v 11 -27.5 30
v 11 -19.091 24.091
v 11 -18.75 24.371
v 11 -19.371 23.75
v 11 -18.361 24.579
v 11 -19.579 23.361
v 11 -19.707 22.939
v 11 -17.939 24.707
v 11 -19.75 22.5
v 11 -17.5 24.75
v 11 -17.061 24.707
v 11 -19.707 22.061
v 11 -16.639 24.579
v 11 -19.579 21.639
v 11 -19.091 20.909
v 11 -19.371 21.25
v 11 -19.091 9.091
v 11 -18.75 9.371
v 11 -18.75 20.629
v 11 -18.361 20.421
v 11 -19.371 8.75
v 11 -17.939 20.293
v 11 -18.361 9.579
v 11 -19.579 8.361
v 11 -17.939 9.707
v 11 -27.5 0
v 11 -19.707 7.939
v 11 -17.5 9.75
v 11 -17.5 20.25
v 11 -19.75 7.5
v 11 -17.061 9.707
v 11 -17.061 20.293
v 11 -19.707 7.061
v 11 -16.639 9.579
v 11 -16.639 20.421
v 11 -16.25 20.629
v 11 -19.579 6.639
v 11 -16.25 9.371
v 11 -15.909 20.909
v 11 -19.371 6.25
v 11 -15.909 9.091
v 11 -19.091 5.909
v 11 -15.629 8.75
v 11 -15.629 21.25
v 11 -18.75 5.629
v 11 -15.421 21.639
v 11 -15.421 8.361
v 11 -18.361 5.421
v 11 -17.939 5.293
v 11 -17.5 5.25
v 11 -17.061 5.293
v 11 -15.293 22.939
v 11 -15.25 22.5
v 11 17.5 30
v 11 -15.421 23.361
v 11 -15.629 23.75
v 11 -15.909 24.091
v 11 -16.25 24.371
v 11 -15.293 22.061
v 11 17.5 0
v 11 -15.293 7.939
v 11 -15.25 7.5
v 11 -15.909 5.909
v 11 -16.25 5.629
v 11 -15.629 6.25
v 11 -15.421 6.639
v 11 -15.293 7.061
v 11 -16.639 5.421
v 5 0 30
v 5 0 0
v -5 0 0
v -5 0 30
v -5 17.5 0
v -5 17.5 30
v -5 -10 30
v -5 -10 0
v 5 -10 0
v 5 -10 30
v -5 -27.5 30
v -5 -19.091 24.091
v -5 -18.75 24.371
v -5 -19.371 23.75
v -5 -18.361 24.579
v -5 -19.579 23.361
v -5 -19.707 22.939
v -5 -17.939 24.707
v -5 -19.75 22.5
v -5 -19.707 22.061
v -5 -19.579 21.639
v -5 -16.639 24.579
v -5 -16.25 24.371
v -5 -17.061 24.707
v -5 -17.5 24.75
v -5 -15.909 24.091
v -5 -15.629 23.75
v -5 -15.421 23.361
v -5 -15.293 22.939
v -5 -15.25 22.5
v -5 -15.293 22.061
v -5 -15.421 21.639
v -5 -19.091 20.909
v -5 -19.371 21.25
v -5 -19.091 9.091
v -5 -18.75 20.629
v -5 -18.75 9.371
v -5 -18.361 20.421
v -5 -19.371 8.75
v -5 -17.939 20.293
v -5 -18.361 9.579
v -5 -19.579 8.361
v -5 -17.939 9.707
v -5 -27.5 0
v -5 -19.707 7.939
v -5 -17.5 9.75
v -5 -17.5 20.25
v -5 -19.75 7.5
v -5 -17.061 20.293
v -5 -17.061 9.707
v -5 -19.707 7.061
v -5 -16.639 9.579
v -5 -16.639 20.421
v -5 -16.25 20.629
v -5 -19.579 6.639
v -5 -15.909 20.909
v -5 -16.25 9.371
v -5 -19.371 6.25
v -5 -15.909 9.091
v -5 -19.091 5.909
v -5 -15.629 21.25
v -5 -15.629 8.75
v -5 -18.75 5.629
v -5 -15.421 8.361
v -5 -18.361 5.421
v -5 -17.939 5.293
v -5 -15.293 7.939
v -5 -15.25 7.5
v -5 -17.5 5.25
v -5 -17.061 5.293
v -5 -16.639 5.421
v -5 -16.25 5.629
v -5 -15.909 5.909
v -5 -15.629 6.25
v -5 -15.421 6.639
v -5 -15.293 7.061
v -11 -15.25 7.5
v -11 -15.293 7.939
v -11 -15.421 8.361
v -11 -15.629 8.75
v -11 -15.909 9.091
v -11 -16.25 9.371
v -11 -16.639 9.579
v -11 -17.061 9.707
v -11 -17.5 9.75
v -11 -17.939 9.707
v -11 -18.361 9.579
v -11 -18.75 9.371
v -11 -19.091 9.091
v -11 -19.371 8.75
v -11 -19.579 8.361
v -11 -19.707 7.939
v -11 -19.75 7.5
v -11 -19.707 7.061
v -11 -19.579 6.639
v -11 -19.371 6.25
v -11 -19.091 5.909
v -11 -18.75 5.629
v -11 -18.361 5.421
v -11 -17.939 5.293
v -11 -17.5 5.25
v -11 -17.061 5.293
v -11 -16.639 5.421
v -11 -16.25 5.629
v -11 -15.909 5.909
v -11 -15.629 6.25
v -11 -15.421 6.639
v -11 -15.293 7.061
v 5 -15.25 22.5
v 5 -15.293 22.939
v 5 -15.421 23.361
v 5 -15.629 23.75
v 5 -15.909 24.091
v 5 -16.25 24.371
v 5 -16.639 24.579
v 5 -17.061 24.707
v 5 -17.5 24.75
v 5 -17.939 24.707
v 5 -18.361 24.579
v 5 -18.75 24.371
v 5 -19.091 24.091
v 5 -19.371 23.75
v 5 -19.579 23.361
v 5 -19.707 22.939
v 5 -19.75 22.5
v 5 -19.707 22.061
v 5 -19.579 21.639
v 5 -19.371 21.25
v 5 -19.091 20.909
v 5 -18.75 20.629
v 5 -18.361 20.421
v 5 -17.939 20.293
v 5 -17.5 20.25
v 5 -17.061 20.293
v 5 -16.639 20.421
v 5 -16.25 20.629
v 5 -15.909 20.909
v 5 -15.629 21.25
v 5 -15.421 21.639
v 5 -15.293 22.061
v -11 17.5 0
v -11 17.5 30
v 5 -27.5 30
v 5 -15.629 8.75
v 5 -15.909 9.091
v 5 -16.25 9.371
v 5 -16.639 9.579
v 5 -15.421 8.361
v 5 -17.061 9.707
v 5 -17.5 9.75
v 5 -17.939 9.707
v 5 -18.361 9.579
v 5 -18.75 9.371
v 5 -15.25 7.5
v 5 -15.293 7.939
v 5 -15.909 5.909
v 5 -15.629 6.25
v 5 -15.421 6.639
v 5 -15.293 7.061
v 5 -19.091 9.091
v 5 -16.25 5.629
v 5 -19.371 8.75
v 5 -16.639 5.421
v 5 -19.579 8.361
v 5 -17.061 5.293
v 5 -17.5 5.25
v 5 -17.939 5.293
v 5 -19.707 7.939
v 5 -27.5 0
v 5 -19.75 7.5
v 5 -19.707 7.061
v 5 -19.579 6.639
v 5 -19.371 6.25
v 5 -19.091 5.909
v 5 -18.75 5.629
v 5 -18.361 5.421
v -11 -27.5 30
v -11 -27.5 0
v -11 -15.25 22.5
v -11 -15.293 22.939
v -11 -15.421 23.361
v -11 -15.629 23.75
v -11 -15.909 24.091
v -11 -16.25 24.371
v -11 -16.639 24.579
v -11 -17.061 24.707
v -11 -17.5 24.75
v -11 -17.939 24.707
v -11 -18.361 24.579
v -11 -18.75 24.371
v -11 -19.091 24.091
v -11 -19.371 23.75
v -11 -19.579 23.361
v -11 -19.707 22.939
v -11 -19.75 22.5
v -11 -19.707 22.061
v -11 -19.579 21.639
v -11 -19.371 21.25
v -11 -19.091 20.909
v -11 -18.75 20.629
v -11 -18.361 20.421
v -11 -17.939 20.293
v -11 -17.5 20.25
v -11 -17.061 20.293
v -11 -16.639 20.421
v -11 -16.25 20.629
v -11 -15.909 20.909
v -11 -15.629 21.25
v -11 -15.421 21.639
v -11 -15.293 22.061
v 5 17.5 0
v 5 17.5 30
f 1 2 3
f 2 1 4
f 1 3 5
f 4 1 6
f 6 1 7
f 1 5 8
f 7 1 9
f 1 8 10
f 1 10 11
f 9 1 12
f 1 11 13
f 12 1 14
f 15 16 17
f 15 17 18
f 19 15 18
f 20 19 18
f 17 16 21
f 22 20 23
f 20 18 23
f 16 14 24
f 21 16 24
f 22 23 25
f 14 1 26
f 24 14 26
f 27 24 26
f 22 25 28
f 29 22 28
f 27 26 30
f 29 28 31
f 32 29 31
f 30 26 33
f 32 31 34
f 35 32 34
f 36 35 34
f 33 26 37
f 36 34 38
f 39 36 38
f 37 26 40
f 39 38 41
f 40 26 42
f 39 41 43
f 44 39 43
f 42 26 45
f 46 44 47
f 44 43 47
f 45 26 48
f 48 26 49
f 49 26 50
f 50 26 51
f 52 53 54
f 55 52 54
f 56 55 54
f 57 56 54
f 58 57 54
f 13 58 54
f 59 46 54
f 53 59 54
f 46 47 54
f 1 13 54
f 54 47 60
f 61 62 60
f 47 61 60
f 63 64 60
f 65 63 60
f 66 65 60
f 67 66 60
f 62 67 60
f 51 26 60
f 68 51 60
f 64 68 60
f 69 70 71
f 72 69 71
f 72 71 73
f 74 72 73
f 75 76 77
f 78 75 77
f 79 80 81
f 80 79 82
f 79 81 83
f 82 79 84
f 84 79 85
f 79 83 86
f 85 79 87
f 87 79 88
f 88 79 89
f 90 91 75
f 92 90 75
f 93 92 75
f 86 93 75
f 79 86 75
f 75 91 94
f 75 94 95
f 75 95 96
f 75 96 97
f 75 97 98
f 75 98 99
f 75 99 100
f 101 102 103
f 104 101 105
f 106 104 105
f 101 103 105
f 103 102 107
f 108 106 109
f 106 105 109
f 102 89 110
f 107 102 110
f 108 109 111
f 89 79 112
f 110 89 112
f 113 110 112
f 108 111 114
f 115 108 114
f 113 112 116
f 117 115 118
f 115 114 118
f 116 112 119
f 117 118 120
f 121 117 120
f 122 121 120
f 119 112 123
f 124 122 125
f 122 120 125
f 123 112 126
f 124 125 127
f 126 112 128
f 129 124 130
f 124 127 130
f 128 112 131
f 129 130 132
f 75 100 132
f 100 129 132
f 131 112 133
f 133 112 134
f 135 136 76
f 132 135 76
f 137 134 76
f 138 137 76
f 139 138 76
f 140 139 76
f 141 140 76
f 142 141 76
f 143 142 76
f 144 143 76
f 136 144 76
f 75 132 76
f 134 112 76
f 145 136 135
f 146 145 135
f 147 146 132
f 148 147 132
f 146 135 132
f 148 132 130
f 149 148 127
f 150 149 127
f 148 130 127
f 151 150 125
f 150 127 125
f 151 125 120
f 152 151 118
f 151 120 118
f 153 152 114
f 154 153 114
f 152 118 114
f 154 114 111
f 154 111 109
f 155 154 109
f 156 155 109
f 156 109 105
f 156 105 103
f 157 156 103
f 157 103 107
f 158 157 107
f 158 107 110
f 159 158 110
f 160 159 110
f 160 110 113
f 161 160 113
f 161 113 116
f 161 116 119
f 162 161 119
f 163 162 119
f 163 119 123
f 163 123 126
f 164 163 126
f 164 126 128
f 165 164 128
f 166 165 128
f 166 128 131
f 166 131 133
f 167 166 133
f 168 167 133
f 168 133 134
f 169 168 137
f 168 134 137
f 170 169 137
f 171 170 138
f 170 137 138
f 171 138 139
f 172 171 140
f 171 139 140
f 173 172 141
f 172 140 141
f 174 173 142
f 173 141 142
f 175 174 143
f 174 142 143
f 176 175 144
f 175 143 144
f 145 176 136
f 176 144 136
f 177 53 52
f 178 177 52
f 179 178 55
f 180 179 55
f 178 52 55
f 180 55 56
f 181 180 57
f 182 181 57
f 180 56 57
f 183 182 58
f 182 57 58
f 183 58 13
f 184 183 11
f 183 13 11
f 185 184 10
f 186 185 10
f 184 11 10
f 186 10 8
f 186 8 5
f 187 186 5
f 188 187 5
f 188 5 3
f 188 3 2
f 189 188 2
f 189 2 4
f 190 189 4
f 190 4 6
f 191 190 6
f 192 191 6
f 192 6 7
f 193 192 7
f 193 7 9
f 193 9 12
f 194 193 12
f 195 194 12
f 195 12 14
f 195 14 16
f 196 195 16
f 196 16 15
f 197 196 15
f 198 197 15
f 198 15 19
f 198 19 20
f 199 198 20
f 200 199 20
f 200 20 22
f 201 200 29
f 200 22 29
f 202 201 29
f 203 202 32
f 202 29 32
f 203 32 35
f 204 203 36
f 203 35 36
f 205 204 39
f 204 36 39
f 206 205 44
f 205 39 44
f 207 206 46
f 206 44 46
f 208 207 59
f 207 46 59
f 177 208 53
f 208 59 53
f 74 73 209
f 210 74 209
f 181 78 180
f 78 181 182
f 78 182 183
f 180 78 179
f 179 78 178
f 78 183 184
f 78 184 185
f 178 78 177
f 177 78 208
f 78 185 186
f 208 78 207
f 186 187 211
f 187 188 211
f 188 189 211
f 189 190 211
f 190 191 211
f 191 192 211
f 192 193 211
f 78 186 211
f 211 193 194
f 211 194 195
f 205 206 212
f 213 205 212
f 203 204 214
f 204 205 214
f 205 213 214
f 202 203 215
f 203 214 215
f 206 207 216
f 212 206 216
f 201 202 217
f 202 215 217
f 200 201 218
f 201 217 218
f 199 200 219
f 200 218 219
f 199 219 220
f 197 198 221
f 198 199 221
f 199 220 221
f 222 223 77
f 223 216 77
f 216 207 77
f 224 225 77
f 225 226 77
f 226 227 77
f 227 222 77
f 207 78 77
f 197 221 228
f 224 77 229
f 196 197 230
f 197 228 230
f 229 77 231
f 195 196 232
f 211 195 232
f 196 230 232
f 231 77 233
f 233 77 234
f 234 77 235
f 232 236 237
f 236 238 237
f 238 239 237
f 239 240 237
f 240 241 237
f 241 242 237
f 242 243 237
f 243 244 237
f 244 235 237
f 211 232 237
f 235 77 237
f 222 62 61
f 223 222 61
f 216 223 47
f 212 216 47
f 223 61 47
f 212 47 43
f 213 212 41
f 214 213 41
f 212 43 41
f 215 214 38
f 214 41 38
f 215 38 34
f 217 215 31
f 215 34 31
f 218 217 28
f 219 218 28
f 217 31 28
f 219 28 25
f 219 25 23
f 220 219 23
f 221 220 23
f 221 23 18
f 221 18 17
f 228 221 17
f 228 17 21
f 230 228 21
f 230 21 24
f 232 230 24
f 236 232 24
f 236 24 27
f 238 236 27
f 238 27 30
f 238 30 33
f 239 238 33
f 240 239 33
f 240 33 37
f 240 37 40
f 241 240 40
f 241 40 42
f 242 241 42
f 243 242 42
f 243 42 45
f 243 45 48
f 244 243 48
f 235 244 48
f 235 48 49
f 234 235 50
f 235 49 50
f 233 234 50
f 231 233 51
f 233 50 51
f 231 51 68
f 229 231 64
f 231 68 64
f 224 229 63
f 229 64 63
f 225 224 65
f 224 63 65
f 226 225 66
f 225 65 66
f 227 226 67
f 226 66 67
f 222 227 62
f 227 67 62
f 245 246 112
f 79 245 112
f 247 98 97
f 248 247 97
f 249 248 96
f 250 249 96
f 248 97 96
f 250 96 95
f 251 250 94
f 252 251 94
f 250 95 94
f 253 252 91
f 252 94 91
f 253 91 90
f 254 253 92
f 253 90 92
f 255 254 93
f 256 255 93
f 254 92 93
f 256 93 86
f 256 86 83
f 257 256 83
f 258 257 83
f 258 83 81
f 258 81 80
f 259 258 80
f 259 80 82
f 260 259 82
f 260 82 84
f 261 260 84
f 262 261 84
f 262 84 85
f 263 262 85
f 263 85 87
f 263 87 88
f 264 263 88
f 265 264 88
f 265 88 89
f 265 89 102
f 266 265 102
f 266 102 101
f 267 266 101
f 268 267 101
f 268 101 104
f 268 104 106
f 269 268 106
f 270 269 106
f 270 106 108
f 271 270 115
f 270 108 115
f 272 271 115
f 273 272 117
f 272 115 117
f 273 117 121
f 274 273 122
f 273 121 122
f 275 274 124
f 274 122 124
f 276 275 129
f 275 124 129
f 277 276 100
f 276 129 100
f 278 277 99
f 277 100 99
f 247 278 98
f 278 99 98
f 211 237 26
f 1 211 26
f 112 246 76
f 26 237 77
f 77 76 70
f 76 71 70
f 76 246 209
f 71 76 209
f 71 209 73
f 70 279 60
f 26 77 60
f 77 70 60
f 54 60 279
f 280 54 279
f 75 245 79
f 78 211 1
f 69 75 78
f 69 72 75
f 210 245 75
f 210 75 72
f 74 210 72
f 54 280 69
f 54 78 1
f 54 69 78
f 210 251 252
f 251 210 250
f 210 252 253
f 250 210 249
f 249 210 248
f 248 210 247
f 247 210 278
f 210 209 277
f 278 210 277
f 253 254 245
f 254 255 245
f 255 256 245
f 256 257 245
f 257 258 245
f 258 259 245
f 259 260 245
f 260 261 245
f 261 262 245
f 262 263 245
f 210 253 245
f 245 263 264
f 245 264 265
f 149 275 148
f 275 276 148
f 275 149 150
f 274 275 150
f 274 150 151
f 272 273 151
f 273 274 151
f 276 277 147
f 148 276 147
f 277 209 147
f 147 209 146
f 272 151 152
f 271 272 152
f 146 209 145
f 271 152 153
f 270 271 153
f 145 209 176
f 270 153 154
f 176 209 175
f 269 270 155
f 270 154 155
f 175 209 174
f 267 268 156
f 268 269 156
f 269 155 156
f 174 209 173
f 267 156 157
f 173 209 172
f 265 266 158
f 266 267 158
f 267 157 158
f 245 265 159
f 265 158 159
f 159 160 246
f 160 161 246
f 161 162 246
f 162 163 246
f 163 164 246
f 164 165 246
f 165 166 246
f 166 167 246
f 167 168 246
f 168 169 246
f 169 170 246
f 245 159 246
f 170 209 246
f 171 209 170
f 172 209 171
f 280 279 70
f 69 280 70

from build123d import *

# Parameters (mm, degrees)
ESTRUSIONE_ESTRUSIONE1_DEPTH = 30
FORO_PER_VITE_M4_1_D         = 4.5
FORO_PER_VITE_M4_1_DEPTH     = 30
FORO_PER_VITE_M4_1_TIP       = 1.351936393


with BuildPart() as part:
    # Schizzo1 → Estrusione-Estrusione1 (new body)
    with BuildSketch(Plane.XY):
        Polygon((11, -27.5), (11, 17.5), (5, 17.5), (5, 0), (-5, 0), (-5, 17.5), (-11, 17.5), (-11, -27.5), (-5, -27.5), (-5, -10), (5, -10), (5, -27.5), align=None)
    extrude(amount=ESTRUSIONE_ESTRUSIONE1_DEPTH)

    # Foro per Vite M4-1
    with Locations(Plane(origin=(-11, -17.5, 22.5), x_dir=(0, -1, 0), z_dir=(-1, 0, 0))):
        with Locations((0, 0), (0, -15)):
            Hole(FORO_PER_VITE_M4_1_D / 2, depth=FORO_PER_VITE_M4_1_DEPTH)
            with Locations((0, 0, -(FORO_PER_VITE_M4_1_DEPTH + FORO_PER_VITE_M4_1_TIP / 2))):  # 118° drill point
                Cone(0, FORO_PER_VITE_M4_1_D / 2, FORO_PER_VITE_M4_1_TIP, mode=Mode.SUBTRACT)


solid = part.part
